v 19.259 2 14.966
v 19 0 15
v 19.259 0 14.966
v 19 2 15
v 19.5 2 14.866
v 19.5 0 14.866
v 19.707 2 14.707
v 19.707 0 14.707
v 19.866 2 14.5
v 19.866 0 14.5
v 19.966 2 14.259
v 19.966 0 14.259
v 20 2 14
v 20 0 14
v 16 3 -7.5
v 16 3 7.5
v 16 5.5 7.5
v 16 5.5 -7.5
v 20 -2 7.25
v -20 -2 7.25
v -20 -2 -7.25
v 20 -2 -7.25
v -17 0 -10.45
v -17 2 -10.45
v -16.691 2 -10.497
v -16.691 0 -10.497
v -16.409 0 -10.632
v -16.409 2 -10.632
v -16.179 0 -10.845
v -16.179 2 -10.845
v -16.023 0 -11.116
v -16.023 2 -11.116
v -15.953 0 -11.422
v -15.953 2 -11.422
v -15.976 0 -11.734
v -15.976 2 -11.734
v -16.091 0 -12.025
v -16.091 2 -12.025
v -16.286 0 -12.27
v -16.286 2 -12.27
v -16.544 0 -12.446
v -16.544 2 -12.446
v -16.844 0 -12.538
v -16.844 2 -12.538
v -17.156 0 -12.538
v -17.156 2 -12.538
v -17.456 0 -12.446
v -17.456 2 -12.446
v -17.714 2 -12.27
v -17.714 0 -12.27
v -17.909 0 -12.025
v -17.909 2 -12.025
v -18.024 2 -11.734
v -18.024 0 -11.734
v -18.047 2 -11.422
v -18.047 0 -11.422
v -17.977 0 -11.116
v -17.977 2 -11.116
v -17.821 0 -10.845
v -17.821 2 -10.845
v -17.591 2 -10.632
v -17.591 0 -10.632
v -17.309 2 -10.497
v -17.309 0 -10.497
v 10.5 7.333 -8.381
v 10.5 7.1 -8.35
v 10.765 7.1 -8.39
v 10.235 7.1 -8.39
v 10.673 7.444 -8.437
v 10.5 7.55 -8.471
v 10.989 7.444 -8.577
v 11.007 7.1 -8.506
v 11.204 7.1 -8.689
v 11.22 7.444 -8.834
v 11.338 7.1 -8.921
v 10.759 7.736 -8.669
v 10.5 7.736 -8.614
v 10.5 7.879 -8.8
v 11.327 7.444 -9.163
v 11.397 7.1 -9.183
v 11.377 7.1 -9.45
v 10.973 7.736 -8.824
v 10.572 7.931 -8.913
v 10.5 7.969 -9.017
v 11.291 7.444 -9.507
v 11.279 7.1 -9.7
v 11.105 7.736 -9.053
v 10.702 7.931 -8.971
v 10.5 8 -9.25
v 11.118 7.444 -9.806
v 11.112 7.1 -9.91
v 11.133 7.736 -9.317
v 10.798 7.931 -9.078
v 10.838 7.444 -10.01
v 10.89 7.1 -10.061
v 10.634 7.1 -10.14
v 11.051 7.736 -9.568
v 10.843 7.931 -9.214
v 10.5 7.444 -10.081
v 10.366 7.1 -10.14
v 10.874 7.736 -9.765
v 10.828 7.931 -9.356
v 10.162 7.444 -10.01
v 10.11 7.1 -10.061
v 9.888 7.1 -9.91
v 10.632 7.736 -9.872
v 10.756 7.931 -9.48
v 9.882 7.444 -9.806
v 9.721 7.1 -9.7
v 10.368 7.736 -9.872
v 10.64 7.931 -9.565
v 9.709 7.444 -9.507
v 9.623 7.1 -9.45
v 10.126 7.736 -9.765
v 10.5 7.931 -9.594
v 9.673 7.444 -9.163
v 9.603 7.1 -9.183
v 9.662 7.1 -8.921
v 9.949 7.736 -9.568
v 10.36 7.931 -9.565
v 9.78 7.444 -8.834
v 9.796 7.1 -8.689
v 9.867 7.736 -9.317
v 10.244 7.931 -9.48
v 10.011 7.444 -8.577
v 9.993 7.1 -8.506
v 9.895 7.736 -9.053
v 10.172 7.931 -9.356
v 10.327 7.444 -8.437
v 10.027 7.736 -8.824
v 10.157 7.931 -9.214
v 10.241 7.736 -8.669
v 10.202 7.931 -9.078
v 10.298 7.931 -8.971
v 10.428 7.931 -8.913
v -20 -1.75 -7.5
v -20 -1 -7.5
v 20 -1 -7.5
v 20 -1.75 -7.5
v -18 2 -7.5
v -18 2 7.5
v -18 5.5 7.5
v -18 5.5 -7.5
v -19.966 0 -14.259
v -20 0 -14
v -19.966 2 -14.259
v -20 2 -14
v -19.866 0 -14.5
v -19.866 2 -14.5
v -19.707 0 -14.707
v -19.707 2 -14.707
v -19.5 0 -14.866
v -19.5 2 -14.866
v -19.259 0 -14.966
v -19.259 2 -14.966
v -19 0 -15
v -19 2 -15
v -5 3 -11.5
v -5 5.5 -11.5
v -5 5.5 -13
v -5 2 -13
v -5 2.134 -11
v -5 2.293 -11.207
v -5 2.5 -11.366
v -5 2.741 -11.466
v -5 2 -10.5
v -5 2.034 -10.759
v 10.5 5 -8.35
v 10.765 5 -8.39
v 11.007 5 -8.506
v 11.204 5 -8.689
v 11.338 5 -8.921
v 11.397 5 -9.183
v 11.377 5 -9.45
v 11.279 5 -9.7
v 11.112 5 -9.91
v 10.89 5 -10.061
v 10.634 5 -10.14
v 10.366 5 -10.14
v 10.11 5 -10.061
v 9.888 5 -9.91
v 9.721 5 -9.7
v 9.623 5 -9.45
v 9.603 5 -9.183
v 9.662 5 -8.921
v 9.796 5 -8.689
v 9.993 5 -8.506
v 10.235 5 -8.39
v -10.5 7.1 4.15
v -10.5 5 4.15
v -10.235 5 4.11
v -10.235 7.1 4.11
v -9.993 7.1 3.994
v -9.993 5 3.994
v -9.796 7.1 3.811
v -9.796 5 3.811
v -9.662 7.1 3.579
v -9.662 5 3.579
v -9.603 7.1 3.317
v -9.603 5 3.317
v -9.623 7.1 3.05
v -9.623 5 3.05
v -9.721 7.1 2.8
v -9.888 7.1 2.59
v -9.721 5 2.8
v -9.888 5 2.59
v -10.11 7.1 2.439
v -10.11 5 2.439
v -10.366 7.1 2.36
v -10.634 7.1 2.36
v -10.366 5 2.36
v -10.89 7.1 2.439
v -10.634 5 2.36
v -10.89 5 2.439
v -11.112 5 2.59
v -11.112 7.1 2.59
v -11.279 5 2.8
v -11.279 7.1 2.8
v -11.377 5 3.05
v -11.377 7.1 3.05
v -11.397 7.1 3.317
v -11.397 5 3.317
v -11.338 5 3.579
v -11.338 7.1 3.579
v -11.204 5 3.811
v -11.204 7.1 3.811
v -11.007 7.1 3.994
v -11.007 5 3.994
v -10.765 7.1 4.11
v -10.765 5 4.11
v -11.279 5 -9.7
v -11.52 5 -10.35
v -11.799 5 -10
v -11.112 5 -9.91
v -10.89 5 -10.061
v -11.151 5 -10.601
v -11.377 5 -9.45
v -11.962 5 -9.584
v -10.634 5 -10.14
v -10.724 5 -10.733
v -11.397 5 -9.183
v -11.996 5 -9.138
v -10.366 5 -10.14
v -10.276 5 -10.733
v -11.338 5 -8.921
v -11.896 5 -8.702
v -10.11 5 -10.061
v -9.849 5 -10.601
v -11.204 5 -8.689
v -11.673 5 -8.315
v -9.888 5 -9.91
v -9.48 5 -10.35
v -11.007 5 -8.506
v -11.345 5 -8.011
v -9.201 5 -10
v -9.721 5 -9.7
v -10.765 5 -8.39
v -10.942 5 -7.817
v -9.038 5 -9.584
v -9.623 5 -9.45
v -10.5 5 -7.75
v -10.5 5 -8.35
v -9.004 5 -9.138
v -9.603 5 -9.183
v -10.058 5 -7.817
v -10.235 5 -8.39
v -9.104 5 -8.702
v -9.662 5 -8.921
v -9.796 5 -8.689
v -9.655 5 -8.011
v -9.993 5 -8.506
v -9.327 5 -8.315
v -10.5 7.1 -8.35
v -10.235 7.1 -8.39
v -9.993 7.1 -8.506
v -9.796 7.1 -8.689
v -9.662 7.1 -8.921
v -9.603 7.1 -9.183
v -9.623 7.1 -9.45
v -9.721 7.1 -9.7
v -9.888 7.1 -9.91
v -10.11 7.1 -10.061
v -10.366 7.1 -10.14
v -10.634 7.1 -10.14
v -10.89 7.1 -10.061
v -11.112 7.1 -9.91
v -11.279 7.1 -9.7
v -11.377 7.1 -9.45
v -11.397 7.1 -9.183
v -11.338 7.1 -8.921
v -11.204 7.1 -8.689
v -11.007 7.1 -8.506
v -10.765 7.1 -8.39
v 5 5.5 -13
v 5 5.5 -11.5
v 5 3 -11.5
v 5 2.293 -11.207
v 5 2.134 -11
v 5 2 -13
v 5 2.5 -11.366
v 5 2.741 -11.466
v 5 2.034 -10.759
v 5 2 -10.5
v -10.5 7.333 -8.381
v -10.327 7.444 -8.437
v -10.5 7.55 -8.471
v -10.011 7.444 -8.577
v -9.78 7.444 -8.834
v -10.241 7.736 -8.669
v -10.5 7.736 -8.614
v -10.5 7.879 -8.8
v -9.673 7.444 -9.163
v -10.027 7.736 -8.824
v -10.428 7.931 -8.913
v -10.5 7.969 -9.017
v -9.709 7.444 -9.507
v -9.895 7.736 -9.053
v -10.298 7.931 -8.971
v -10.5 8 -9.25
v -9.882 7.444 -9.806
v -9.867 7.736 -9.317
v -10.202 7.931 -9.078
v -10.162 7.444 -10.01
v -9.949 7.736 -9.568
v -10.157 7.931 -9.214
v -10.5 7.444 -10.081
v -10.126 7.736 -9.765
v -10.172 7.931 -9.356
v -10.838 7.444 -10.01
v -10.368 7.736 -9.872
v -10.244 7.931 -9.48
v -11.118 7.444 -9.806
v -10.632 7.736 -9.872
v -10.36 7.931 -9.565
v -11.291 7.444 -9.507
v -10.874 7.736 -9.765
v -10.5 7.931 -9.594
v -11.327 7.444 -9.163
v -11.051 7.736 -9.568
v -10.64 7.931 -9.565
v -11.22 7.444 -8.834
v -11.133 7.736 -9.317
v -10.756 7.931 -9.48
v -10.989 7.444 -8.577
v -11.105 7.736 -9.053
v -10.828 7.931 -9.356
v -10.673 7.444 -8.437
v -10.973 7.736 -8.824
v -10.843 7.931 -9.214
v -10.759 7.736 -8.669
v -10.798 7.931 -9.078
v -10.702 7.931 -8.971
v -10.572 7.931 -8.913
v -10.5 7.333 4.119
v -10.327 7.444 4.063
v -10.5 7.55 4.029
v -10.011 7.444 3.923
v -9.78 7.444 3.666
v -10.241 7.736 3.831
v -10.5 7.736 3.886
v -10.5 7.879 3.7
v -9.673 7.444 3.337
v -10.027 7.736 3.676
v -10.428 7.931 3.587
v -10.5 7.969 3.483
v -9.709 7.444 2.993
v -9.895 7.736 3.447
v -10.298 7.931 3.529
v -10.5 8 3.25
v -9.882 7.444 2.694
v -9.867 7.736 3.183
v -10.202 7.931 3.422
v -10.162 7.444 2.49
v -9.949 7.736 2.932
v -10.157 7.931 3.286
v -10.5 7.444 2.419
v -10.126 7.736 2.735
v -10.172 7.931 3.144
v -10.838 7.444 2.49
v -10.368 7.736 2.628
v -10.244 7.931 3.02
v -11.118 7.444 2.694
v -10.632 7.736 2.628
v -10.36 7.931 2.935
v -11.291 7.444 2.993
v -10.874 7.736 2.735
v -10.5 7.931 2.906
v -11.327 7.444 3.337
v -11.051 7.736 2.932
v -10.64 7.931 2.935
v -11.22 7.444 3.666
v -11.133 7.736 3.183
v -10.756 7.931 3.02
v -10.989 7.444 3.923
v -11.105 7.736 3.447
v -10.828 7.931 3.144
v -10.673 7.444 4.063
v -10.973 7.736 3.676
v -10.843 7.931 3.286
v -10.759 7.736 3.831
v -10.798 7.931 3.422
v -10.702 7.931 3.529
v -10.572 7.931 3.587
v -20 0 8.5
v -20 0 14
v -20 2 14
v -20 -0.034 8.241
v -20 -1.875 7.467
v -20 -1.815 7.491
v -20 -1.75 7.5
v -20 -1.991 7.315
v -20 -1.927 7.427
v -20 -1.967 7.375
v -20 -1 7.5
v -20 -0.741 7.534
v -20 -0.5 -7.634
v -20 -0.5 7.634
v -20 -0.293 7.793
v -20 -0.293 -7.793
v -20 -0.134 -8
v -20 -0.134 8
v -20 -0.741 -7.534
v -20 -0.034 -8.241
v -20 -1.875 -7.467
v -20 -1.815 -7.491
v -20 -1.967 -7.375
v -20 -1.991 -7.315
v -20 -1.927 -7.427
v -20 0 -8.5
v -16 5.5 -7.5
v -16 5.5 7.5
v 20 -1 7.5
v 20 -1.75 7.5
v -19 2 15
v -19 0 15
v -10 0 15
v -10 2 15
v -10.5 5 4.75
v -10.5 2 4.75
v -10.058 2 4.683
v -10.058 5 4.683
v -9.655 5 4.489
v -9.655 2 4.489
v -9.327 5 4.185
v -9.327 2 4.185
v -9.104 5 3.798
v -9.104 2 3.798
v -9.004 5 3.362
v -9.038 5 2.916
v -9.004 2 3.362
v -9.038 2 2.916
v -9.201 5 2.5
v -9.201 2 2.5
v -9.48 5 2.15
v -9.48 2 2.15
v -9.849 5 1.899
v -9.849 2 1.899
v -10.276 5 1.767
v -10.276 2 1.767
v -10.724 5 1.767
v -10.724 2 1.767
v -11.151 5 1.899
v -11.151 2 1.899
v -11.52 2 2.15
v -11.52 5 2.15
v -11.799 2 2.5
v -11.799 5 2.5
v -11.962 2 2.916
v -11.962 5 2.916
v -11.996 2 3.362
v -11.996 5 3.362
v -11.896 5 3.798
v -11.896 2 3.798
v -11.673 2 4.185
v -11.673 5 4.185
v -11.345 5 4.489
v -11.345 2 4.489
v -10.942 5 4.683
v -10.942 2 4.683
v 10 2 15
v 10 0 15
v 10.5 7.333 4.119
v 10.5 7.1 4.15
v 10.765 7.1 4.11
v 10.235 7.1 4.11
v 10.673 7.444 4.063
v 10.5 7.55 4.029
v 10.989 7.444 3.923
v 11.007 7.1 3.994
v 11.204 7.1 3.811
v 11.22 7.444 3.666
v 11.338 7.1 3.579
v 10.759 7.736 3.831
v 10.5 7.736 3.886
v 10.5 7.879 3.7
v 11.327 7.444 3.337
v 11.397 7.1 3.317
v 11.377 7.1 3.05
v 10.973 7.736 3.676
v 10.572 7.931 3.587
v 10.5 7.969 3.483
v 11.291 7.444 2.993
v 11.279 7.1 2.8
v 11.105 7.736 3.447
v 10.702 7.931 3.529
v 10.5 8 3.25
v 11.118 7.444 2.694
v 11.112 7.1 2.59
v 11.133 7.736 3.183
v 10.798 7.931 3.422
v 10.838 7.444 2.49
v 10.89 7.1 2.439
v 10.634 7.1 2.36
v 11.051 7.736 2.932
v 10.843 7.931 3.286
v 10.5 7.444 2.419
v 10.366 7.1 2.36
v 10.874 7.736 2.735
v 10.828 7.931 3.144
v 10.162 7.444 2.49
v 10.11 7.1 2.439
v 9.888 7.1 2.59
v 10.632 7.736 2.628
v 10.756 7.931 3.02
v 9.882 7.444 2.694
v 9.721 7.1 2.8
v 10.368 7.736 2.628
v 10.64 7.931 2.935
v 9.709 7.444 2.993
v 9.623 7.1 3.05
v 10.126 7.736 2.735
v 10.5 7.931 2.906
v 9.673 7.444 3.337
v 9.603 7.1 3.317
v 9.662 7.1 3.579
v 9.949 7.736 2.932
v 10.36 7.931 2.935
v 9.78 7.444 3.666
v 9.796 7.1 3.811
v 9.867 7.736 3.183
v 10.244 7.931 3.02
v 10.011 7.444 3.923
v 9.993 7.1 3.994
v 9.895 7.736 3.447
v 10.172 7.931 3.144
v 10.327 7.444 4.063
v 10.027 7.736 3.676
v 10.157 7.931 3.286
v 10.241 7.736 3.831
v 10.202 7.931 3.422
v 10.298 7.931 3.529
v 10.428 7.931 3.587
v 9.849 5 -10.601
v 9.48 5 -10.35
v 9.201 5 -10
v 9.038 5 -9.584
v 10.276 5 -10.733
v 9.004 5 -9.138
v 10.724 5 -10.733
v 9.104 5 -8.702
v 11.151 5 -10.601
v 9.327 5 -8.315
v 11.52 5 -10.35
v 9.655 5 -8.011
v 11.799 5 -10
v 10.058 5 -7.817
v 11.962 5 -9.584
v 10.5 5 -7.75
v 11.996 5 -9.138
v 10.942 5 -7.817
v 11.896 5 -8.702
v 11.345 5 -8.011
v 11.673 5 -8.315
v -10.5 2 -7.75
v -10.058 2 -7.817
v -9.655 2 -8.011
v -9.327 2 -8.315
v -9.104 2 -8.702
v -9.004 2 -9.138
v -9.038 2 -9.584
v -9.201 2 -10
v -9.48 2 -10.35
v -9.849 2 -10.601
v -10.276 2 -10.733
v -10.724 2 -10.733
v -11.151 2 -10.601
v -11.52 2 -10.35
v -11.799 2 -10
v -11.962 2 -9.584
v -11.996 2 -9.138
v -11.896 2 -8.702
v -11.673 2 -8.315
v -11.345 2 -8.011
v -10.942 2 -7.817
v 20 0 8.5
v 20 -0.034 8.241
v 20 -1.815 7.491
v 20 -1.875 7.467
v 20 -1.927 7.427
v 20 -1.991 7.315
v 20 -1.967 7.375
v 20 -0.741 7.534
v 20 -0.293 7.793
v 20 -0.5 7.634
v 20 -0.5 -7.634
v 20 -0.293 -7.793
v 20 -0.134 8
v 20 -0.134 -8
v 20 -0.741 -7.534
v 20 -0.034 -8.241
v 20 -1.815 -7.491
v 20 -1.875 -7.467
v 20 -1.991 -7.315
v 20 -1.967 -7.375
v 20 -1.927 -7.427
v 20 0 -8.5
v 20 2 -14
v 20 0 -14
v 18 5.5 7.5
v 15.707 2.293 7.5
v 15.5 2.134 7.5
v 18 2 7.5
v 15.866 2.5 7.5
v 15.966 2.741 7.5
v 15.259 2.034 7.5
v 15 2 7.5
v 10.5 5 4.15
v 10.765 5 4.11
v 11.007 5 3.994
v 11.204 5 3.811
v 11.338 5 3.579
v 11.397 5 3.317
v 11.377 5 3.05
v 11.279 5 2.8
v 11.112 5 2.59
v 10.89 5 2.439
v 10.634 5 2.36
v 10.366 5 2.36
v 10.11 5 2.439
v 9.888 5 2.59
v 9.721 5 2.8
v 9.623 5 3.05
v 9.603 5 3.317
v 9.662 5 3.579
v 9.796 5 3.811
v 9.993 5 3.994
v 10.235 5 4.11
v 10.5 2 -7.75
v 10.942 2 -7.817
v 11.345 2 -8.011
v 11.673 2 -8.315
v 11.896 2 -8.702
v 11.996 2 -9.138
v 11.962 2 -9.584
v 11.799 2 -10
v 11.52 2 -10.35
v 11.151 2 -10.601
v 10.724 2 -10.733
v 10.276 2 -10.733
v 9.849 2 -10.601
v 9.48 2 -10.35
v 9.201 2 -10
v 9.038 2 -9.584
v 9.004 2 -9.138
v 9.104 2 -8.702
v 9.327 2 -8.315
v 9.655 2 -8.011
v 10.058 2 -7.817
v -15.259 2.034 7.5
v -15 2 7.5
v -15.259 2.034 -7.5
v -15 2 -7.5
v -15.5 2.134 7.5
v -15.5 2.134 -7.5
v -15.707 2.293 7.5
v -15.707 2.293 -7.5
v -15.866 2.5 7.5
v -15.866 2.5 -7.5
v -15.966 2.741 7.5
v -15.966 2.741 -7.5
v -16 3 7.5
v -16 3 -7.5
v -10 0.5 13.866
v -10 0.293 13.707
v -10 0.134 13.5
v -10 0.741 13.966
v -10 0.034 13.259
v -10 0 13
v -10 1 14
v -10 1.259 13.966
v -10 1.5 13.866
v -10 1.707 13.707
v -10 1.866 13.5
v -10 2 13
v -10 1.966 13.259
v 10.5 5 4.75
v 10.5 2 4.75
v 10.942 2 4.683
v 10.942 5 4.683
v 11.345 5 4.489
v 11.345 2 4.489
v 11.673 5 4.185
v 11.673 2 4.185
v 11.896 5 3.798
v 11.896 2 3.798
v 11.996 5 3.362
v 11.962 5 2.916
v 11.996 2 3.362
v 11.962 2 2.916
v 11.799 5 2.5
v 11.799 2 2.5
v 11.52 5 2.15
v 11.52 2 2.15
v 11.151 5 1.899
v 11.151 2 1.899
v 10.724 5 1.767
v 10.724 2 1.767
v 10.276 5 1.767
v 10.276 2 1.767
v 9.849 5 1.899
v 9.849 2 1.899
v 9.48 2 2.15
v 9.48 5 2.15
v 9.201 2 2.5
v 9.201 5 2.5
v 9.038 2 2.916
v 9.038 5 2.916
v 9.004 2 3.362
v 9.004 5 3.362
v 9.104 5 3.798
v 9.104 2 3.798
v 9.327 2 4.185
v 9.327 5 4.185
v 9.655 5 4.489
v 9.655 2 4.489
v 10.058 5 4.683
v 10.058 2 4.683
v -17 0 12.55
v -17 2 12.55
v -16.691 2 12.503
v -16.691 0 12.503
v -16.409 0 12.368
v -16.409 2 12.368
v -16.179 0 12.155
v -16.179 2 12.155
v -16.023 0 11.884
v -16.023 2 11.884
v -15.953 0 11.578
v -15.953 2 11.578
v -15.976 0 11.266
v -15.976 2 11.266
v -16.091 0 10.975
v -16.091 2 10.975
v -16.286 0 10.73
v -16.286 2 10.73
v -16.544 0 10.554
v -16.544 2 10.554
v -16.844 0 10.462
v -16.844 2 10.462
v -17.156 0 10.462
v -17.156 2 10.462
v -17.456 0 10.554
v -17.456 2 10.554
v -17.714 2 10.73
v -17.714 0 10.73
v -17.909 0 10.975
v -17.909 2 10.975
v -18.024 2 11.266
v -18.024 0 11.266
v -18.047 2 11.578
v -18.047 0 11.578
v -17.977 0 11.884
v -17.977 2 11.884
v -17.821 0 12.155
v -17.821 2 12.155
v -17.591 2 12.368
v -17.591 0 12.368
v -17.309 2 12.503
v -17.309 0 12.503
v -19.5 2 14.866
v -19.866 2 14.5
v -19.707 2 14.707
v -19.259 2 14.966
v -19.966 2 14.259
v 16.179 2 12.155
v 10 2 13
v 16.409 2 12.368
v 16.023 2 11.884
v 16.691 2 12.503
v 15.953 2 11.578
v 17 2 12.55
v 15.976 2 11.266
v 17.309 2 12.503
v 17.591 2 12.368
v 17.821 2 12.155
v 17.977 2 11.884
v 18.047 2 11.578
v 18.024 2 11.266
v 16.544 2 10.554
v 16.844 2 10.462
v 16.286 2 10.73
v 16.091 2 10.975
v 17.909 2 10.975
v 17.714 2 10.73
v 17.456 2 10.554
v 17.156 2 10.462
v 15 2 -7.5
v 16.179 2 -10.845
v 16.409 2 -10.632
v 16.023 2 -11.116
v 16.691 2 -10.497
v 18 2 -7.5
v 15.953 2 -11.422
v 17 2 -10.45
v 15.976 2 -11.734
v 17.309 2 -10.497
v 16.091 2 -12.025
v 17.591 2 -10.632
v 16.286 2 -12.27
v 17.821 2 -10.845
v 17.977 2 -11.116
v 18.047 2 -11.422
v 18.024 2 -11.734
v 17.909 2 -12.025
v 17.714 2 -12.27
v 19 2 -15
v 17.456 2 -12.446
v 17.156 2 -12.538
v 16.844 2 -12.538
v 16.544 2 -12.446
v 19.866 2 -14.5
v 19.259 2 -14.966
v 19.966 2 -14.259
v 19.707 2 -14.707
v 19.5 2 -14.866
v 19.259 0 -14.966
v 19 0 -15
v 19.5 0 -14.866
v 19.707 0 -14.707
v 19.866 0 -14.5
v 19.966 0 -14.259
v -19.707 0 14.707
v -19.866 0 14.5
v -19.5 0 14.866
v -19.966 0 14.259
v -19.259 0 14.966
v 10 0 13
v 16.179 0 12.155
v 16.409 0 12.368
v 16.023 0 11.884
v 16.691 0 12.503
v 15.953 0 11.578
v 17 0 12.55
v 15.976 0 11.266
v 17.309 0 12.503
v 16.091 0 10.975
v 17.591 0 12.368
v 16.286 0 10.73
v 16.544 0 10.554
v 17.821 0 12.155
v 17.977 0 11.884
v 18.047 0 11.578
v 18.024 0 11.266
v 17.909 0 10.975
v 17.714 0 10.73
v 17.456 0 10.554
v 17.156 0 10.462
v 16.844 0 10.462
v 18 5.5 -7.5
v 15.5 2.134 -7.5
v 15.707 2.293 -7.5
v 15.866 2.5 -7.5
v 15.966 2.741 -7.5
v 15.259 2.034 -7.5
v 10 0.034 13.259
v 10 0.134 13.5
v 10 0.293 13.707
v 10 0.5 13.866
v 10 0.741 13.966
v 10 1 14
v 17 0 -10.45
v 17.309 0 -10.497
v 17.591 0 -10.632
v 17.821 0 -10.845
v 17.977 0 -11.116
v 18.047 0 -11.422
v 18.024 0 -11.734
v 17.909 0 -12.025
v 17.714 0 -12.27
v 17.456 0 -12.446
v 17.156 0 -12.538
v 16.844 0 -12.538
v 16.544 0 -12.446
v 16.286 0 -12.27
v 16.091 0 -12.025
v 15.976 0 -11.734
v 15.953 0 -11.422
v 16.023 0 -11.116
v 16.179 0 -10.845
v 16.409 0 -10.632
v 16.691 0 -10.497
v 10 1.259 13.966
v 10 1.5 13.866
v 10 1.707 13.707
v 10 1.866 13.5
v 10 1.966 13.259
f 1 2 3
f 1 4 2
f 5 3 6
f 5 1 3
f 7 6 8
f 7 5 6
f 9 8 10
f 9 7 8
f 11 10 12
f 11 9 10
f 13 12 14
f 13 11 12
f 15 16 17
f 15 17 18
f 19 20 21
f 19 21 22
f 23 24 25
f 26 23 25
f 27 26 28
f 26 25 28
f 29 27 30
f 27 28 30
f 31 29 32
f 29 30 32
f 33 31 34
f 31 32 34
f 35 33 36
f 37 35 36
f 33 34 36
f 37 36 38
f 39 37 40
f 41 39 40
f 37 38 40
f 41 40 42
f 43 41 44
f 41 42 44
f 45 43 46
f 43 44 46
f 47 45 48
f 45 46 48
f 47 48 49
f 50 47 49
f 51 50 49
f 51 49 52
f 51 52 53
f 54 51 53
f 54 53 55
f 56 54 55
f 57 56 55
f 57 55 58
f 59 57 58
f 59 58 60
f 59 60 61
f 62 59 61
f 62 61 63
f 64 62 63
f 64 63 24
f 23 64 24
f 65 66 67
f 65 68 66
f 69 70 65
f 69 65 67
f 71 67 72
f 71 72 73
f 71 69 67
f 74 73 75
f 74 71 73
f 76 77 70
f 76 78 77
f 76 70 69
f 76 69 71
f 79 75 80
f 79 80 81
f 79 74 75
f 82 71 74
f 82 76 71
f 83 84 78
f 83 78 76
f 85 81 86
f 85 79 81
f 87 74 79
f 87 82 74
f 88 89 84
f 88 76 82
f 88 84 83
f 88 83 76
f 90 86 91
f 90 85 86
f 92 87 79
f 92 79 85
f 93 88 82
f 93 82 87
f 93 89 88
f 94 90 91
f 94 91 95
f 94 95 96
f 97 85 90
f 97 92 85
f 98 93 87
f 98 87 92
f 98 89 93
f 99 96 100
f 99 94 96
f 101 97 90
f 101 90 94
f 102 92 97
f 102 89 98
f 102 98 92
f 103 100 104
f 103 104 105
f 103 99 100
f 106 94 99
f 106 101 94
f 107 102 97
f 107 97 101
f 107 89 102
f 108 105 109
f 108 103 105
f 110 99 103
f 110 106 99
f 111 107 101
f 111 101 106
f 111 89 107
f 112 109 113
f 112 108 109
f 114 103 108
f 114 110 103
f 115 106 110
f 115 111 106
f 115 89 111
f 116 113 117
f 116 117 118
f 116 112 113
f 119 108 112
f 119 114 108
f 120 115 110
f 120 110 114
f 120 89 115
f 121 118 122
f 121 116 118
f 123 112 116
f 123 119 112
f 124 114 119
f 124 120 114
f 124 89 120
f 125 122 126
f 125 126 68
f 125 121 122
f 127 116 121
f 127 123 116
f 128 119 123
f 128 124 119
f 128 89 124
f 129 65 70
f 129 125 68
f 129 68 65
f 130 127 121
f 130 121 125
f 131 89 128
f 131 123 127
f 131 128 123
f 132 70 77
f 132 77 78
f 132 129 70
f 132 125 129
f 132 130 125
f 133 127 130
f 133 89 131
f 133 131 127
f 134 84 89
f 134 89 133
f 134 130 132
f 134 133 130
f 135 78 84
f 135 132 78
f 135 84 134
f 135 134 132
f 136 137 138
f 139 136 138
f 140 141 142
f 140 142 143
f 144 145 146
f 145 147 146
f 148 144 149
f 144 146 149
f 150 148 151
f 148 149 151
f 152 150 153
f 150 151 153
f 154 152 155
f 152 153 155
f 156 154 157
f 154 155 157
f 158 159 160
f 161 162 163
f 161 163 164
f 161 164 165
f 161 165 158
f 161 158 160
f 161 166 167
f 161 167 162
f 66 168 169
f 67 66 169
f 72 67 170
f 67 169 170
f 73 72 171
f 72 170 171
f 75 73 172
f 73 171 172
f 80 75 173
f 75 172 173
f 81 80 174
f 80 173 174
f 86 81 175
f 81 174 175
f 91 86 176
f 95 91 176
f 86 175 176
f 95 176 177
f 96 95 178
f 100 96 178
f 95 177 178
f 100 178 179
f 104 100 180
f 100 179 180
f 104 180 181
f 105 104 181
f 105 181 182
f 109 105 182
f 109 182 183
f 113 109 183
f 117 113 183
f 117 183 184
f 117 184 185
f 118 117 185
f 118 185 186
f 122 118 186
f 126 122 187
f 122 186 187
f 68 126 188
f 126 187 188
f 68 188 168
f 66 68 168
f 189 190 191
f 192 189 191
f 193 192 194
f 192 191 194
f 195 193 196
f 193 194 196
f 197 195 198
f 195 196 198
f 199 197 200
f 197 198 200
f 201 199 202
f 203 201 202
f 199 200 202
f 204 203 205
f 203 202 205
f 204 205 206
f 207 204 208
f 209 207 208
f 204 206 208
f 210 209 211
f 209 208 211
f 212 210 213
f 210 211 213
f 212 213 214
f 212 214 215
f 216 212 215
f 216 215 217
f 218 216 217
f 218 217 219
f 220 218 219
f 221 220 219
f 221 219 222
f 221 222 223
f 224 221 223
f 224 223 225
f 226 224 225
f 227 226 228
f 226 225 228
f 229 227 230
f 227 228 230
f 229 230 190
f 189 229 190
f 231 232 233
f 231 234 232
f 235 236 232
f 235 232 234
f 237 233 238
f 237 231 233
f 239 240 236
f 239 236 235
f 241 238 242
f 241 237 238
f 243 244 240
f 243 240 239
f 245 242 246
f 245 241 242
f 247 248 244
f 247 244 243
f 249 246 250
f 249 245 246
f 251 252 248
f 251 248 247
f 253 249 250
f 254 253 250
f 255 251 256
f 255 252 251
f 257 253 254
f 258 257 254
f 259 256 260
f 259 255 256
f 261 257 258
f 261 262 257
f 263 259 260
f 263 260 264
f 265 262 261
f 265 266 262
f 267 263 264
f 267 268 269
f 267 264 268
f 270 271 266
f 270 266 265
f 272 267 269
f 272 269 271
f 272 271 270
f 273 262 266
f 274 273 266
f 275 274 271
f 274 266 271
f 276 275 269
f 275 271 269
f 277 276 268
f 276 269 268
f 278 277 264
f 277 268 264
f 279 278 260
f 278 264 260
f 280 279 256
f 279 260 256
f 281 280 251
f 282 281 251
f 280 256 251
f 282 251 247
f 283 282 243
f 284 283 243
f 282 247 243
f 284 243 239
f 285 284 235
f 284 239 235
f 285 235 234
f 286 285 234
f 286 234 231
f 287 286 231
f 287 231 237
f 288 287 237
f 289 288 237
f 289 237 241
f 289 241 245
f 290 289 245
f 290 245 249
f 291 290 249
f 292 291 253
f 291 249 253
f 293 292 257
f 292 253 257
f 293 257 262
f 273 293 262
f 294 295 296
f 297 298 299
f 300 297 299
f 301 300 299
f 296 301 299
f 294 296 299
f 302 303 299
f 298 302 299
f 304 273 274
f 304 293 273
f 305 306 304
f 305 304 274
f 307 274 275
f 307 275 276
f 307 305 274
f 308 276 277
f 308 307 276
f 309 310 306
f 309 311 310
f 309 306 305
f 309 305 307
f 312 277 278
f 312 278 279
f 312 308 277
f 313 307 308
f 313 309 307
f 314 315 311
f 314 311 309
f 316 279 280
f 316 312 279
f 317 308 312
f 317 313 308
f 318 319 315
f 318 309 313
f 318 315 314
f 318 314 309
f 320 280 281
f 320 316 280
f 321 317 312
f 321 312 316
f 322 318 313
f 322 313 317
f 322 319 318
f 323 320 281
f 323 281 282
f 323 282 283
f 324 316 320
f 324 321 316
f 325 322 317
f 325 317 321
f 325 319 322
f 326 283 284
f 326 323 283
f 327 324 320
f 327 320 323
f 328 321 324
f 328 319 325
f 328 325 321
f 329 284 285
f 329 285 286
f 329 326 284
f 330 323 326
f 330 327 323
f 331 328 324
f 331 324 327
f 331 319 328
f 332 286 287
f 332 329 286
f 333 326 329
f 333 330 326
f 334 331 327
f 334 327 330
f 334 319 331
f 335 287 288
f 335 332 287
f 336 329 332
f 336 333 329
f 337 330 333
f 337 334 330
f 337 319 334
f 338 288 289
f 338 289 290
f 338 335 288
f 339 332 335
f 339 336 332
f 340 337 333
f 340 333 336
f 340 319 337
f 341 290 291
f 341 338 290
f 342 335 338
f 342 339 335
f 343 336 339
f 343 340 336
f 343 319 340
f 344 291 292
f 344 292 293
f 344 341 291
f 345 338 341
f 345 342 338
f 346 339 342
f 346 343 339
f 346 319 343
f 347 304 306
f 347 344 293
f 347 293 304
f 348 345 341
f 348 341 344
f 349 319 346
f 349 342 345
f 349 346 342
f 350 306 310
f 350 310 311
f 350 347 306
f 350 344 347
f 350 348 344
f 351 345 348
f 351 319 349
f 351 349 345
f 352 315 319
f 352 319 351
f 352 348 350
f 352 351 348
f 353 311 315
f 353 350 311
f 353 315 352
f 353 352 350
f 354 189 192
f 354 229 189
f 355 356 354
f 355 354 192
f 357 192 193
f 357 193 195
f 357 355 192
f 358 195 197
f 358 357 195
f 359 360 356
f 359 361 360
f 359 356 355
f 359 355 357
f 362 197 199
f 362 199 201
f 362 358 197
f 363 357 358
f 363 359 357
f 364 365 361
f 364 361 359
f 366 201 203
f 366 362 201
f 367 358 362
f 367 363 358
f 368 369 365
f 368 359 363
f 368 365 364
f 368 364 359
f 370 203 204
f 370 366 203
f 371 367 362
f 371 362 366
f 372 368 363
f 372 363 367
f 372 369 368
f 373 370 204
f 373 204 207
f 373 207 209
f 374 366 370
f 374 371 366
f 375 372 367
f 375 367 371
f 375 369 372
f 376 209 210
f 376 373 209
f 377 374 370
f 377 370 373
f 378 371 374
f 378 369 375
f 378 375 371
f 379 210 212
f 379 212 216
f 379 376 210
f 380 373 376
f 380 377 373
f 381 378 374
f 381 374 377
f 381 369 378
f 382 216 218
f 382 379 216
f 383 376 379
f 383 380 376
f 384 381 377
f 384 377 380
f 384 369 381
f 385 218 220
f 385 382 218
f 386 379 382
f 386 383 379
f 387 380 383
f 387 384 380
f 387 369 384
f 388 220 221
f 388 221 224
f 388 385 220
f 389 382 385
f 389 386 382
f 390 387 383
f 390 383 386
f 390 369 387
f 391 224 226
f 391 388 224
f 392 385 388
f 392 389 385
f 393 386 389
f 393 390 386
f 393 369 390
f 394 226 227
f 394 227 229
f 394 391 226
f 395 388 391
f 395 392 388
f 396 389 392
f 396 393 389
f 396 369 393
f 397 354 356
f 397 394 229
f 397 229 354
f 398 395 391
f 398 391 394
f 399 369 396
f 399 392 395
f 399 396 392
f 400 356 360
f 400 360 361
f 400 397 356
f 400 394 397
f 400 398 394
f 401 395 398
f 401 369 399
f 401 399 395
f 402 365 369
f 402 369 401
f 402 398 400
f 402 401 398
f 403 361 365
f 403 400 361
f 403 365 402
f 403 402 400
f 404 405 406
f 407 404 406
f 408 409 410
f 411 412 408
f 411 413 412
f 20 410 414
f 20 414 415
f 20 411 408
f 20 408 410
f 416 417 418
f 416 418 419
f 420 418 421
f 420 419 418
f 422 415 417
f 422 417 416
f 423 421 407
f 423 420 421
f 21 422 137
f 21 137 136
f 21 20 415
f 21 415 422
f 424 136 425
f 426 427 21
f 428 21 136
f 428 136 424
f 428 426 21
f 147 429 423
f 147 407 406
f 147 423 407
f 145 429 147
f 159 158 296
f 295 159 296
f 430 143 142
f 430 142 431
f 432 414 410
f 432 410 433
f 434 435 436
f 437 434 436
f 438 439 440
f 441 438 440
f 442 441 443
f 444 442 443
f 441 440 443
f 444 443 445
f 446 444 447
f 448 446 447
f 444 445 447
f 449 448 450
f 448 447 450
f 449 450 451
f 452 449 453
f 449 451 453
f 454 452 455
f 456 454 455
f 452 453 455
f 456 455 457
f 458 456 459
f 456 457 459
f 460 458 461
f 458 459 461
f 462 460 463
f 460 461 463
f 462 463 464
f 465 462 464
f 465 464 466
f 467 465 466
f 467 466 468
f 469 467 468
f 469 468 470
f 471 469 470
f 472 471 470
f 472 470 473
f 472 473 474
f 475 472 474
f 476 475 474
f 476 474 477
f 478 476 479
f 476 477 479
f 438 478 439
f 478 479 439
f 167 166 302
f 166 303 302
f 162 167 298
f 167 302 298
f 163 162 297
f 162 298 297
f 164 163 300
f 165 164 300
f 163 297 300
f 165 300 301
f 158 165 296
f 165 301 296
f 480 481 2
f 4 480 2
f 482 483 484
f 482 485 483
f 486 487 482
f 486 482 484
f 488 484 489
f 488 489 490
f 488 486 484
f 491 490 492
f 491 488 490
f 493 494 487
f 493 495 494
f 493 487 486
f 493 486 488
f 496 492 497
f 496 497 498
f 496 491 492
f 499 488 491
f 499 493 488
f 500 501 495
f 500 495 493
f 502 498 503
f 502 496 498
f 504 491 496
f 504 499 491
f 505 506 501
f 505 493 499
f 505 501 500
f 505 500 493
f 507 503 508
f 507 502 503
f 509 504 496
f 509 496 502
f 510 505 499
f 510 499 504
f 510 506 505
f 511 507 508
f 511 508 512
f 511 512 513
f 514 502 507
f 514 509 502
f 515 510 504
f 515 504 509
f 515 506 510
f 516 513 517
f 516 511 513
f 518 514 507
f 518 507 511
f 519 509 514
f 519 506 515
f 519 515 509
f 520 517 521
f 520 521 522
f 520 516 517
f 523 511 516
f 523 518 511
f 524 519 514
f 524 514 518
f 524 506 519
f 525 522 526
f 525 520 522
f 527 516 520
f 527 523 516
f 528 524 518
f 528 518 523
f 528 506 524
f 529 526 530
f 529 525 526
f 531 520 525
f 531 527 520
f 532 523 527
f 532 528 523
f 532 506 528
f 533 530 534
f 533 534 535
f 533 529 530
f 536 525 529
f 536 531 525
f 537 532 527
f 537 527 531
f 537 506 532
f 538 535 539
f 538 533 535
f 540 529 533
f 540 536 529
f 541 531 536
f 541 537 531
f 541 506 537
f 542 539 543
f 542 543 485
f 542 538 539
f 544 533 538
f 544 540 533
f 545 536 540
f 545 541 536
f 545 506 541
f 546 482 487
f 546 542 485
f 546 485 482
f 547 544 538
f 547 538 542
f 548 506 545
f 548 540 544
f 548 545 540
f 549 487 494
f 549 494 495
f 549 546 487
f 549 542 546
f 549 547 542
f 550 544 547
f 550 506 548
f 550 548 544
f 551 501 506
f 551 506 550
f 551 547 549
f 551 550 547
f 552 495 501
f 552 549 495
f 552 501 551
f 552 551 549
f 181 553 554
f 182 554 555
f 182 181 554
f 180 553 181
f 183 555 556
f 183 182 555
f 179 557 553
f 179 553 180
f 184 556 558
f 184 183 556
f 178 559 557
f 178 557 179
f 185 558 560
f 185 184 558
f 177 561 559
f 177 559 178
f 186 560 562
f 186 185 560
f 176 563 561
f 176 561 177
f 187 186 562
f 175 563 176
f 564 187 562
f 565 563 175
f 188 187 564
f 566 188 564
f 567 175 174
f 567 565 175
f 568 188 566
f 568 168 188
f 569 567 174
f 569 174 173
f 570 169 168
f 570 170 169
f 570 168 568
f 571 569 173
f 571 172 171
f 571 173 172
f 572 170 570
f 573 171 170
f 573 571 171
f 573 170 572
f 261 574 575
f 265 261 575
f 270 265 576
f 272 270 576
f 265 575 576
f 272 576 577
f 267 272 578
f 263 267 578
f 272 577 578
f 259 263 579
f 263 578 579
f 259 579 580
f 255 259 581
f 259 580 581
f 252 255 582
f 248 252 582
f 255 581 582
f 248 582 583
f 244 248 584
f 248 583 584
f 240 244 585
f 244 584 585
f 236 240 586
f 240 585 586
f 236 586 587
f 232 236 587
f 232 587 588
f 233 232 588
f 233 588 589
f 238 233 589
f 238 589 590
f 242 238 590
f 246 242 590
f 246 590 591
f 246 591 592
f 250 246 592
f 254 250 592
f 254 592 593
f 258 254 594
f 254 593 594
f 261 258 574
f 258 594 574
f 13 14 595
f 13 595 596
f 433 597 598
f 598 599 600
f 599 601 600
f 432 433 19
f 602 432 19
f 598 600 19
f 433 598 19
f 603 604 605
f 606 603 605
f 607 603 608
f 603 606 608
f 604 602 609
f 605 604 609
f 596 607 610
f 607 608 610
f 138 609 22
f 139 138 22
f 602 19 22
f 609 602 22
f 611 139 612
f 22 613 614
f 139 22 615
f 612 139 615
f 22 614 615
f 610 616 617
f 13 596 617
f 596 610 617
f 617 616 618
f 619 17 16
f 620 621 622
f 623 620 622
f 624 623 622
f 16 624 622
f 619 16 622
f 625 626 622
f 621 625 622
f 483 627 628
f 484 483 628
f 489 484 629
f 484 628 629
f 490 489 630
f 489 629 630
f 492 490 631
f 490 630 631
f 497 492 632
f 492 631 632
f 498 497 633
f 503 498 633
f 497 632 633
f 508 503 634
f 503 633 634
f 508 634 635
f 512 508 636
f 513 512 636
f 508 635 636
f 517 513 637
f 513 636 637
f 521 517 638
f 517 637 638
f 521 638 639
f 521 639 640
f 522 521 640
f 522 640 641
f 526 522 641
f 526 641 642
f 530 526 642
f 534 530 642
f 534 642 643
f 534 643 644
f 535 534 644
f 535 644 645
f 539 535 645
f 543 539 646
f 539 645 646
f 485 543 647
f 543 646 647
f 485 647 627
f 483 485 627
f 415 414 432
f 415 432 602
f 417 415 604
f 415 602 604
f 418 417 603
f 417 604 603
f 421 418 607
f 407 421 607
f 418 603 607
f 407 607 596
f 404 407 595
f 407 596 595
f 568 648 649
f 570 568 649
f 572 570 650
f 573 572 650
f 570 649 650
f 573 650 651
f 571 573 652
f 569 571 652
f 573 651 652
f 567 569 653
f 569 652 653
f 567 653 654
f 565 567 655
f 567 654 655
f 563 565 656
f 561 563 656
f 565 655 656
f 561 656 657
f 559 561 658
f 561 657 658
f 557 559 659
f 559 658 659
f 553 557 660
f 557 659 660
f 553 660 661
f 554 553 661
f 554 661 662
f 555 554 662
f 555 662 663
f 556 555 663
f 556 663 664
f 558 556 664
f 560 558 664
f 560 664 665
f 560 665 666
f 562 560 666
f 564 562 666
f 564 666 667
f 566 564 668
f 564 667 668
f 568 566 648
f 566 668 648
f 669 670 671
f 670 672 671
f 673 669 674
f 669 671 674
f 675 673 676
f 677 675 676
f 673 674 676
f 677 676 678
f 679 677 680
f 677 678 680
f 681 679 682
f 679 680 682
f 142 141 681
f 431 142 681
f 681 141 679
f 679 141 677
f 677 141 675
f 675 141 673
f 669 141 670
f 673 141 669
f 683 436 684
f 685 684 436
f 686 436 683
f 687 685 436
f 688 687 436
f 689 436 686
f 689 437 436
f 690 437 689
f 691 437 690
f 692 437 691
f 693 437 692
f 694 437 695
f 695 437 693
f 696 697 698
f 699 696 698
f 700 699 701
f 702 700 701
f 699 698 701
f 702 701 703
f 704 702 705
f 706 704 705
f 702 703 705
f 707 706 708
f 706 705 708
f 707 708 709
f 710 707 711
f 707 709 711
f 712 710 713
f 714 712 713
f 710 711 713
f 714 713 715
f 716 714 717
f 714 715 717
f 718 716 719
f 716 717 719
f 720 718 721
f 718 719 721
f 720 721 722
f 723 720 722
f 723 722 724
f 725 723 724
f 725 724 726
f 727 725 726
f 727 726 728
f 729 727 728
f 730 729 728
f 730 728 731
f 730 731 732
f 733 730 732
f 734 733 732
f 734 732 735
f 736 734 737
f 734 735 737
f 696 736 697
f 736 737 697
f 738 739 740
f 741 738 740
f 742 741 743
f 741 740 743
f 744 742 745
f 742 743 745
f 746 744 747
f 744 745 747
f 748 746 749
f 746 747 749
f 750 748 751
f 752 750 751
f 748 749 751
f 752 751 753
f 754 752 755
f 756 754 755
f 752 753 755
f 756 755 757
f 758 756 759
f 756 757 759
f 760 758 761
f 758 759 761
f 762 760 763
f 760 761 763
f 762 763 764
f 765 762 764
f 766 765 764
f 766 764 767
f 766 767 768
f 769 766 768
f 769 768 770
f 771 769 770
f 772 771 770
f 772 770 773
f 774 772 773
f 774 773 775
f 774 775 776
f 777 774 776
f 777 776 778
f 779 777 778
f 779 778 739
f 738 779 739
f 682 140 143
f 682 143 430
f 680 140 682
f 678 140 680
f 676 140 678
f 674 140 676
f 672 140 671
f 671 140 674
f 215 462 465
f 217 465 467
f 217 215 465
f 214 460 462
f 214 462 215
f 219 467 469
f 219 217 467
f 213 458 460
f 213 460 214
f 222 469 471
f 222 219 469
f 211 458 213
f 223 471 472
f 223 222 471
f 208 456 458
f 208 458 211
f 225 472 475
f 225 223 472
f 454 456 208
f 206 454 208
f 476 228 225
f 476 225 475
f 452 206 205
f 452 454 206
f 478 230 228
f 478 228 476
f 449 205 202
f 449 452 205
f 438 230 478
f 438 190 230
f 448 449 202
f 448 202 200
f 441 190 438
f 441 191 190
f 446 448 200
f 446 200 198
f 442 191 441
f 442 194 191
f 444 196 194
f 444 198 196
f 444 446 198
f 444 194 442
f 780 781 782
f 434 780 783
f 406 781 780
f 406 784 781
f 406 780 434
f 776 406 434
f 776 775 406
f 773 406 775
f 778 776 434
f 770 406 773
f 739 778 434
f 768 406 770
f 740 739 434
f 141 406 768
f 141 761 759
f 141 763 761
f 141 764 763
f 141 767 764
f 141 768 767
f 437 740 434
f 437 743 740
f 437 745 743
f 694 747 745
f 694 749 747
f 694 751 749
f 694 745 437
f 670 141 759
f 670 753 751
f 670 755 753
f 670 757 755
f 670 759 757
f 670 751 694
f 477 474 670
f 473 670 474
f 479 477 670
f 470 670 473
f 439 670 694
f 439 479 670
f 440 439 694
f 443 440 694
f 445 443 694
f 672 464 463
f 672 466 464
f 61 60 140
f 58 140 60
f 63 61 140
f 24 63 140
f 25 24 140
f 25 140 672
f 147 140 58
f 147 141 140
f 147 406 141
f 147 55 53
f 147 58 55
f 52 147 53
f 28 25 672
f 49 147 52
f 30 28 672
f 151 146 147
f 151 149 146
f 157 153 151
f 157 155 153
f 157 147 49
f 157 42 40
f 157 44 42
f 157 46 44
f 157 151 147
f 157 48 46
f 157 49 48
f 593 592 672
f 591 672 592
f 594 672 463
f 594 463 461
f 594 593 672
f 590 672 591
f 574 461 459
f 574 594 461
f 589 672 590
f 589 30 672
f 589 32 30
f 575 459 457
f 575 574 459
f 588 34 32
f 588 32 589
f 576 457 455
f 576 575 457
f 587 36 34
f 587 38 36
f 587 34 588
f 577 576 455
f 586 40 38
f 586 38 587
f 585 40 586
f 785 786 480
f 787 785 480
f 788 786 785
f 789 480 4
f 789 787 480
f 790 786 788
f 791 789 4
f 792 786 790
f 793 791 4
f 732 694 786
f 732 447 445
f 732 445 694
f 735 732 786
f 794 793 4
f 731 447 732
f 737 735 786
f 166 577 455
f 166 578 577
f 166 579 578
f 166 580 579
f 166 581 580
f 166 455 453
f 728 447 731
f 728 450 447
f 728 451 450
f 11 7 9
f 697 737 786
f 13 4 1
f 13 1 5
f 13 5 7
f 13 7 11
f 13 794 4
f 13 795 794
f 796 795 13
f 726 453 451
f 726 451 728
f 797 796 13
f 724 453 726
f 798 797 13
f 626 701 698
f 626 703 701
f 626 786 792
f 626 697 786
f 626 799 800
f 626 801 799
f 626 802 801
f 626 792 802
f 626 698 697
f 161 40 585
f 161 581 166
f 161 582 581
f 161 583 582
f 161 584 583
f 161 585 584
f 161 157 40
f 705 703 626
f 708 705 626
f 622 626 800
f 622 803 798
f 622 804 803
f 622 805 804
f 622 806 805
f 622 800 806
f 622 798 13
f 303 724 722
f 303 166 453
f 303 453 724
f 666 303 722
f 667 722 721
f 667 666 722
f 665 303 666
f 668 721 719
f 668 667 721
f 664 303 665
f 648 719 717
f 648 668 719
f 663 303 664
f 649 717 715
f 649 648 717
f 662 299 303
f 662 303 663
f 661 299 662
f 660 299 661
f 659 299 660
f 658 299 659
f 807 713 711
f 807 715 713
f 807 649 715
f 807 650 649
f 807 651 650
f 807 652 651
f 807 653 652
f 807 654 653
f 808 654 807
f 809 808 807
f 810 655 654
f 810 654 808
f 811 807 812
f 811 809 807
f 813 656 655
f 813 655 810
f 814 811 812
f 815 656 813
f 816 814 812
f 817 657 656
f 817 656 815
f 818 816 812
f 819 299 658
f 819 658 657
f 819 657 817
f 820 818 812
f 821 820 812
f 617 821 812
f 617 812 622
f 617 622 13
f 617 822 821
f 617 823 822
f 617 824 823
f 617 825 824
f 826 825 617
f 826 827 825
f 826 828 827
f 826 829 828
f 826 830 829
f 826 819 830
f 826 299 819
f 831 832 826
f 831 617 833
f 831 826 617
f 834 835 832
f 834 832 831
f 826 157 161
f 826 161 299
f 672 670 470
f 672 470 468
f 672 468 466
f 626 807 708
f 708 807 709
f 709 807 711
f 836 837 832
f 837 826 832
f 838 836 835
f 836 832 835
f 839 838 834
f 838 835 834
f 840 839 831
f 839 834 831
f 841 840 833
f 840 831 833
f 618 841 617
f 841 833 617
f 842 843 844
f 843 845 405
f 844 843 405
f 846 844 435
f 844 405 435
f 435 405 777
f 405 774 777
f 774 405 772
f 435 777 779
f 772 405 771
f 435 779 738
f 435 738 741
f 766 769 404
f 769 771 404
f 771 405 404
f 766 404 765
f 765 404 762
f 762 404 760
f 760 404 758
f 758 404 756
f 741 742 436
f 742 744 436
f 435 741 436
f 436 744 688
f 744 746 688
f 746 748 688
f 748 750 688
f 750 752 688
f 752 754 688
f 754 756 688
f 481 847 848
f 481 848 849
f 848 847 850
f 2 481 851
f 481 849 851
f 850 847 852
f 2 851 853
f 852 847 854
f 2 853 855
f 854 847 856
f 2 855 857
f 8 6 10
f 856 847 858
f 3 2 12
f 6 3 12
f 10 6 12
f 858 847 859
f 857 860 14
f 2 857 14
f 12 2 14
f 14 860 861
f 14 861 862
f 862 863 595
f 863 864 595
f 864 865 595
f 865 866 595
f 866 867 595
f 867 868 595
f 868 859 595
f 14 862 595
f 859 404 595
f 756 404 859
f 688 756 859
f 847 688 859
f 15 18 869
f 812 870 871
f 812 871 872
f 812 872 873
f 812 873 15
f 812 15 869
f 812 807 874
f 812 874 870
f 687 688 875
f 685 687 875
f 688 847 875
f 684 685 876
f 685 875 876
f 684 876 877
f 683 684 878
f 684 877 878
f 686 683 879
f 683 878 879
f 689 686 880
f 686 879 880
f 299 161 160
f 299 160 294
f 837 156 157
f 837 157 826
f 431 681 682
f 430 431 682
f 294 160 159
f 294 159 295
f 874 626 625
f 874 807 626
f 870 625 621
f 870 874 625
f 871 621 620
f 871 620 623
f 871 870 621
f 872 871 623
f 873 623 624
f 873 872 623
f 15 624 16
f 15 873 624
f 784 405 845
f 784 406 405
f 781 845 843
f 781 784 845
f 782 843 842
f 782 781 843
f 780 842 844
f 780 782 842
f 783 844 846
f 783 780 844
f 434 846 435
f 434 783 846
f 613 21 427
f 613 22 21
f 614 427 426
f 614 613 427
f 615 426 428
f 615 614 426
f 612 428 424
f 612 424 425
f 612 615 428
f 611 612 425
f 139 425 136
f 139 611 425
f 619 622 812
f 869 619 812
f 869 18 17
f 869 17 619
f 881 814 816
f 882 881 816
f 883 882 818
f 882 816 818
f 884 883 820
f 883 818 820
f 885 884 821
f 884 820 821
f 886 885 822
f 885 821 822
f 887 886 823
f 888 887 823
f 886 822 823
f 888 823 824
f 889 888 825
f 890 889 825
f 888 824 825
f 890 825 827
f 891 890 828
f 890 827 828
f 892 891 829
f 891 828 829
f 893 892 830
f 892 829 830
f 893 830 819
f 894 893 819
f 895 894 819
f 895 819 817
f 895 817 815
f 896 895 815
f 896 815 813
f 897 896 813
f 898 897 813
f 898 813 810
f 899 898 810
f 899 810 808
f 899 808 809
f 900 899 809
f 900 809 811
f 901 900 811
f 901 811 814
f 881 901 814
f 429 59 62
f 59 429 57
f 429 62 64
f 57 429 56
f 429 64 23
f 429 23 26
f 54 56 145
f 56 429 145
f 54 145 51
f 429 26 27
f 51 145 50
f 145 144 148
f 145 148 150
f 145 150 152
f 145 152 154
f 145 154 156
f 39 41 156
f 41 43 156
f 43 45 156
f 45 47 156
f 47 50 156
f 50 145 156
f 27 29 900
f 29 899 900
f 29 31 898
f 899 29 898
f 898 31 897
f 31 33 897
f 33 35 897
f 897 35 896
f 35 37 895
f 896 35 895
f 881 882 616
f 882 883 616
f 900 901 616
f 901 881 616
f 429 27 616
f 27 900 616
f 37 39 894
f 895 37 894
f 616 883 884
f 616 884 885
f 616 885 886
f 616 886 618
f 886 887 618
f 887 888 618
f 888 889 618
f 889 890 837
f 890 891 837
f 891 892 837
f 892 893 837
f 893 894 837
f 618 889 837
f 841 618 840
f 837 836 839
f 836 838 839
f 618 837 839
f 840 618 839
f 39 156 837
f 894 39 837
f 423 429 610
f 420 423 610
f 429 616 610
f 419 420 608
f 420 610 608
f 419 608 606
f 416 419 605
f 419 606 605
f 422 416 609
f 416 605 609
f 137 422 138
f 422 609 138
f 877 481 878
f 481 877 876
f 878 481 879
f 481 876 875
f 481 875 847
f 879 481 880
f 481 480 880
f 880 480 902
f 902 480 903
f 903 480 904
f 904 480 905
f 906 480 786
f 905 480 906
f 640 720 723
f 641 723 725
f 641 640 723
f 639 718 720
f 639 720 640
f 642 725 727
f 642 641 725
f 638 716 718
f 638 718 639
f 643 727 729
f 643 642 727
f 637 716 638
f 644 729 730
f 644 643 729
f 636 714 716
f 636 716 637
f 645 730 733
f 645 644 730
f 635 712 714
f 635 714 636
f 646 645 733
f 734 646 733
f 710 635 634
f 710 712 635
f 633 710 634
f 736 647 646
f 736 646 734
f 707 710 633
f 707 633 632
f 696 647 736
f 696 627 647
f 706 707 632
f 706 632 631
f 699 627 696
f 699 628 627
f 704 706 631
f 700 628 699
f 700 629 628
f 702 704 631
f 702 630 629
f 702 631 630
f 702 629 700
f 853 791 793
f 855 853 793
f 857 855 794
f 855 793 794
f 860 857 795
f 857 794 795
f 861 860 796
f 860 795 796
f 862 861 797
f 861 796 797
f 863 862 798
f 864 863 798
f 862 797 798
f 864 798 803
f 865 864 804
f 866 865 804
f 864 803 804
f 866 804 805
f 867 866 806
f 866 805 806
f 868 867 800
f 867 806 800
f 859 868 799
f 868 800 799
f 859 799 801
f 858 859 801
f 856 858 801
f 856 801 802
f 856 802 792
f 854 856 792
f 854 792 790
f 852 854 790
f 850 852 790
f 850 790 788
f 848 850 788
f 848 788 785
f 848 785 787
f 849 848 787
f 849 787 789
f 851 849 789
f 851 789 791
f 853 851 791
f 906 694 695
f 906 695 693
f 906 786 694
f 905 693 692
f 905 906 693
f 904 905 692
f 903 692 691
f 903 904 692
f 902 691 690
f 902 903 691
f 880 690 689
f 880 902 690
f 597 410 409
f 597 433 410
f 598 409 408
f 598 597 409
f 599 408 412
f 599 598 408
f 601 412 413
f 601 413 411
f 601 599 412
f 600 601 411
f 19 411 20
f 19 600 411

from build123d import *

# Parameters (mm, degrees)
SKETCH3_W               = 40
SKETCH3_H               = 30
BOSS_EXTRUDE1_DEPTH     = 2
SKETCH4_R               = 1.5
BOSS_EXTRUDE2_DEPTH     = 3
FILLET1_R               = 1
SKETCH8_W               = 20
SKETCH8_H               = 1
CUT_EXTRUDE2_DEPTH      = 2
FILLET3_R               = 1
SKETCH9_R               = 0.9
BOSS_EXTRUDE5_DEPTH     = 3
LPATTERN3_COUNT         = 2
LPATTERN3_PITCH         = 21
LPATTERN3_COUNT_DIR2    = 2
LPATTERN3_PITCH_DIR2    = 12.5
FILLET4_R               = 0.9
FILLET5_R               = 1
SKETCH11_R              = 1.05
CUT_EXTRUDE3_DEPTH      = 26.709920264
LPATTERN4_COUNT         = 2
LPATTERN4_PITCH         = 23
LPATTERN4_COUNT_DIR2    = 2
LPATTERN4_PITCH_DIR2    = 34
SKETCH12_W              = 40
SKETCH12_H              = 2.5
BOSS_EXTRUDE7_DEPTH     = 10
SKETCH13_R              = 2
CUT_EXTRUDE4_DEPTH      = 10
SKETCH14_W              = 2
SKETCH14_H              = 15
SKETCH14_W_2            = 10
SKETCH14_H_2            = 1.5
BOSS_EXTRUDE8_DEPTH     = 3.5
FILLET6_R               = 1
CUT_EXTRUDE5_DEPTH      = 44.874821937
CUT_EXTRUDE5_DEPTH_BACK = 44.874821937
SKETCH15_W              = 33.433671885
SKETCH15_H              = 17.879130682
SKETCH16_W              = 40
SKETCH16_H              = 15
BOSS_EXTRUDE9_DEPTH     = 2
FILLET8_R               = 1
FILLET9_R               = 1
FILLET10_R              = 0.25


with BuildPart() as part:
    # Sketch3 → Boss-Extrude1 (new body)
    with BuildSketch(Plane(origin=(0, 0, 0), x_dir=(1, 0, 0), z_dir=(0, 1, 0))):
        Rectangle(SKETCH3_W, SKETCH3_H)
    extrude(amount=BOSS_EXTRUDE1_DEPTH)

    # Sketch4 → Boss-Extrude2 (add)
    with BuildSketch(Plane(origin=(0, 2, 0), x_dir=(1, 0, 0), z_dir=(0, 1, 0))):
        with Locations(Location((-10.5, 9.25, 0), (0, 0, 270))):
            Circle(SKETCH4_R)
        with Locations(Location((10.5, 9.25, 0), (0, 0, 270))):
            Circle(SKETCH4_R)
        with Locations(Location((10.5, -3.25, 0), (0, 0, 270))):
            Circle(SKETCH4_R)
        with Locations(Location((-10.5, -3.25, 0), (0, 0, 270))):
            Circle(SKETCH4_R)
    extrude(amount=BOSS_EXTRUDE2_DEPTH)

    # Fillet1
    fillet1_edges = [part.edges().sort_by_distance(p)[0] for p in [
        (-20, 1, -15),
        (20, 1, -15),
    ]]
    fillet(fillet1_edges, radius=FILLET1_R)

    # Sketch8 → Cut-Extrude2 (cut)
    with BuildSketch(Plane(origin=(0, 2, 0), x_dir=(1, 0, 0), z_dir=(0, 1, 0))):
        with Locations((0, -14.5)):
            Rectangle(SKETCH8_W, SKETCH8_H)
    extrude(amount=-CUT_EXTRUDE2_DEPTH, mode=Mode.SUBTRACT)

    # Fillet3
    fillet3_edges = [part.edges().sort_by_distance(p)[0] for p in [
        (0, 0, 14),
        (0, 2, 14),
    ]]
    fillet(fillet3_edges, radius=FILLET3_R - 0.0001)  # a hair under: the kernel refuses the full size

    # Sketch9 → Boss-Extrude5 (add)
    with BuildSketch(Plane(origin=(0, 5, 0), x_dir=(1, 0, 0), z_dir=(0, 1, 0))):
        with Locations(Location((-10.5, 9.25, 0), (0, 0, 270))):
            Circle(SKETCH9_R)
    boss_extrude5 = extrude(amount=BOSS_EXTRUDE5_DEPTH)

    # LPattern3: Boss-Extrude5 2 × 2
    with Locations(*[(i * LPATTERN3_PITCH, 0, j * LPATTERN3_PITCH_DIR2) for i in range(LPATTERN3_COUNT) for j in range(LPATTERN3_COUNT_DIR2) if (i, j) != (0, 0)]):
        add(boss_extrude5)

    # Fillet4
    fillet4_edges = [part.edges().sort_by_distance(p)[0] for p in [
        (-10.5, 8, -10.15),
        (-10.5, 8, 2.35),
        (10.5, 8, -10.15),
        (10.5, 8, 2.35),
    ]]
    fillet(fillet4_edges, radius=FILLET4_R)

    # Fillet5
    fillet5_edges = [part.edges().sort_by_distance(p)[0] for p in [
        (20, 1, 15),
        (-20, 1, 15),
    ]]
    fillet(fillet5_edges, radius=FILLET5_R)

    # Sketch11 → Cut-Extrude3 (cut, through all)
    with BuildSketch(Plane(origin=(0, 2, 0), x_dir=(1, 0, 0), z_dir=(0, 1, 0))):
        with Locations(Location((-17, -11.5, 0), (0, 0, 270))):
            Circle(SKETCH11_R)
    cut_extrude3 = extrude(amount=-CUT_EXTRUDE3_DEPTH, mode=Mode.SUBTRACT)

    # LPattern4: Cut-Extrude3 2 × 2
    with Locations(*[(j * LPATTERN4_PITCH_DIR2, 0, -i * LPATTERN4_PITCH) for i in range(LPATTERN4_COUNT) for j in range(LPATTERN4_COUNT_DIR2) if (i, j) != (0, 0)]):
        add(cut_extrude3, mode=Mode.SUBTRACT)

    # Sketch12 → Boss-Extrude7 (add)
    with BuildSketch(Plane(origin=(0, 0, 0), x_dir=(-1, 0, 0), z_dir=(0, -1, 0))):
        with Locations((0, 2.25)):
            Rectangle(SKETCH12_W, SKETCH12_H)
    extrude(amount=BOSS_EXTRUDE7_DEPTH)

    # Sketch13 → Cut-Extrude4 (cut)
    with BuildSketch(Plane(origin=(0, 0, -3.5), x_dir=(-1, 0, 0), z_dir=(0, 0, -1))):
        with Locations((12, -5)):
            Circle(SKETCH13_R)
        with Locations((0, -5)):
            Circle(SKETCH13_R)
    extrude(amount=-CUT_EXTRUDE4_DEPTH, mode=Mode.SUBTRACT)

    # Sketch14 → Boss-Extrude8 (add)
    with BuildSketch(Plane(origin=(0, 2, 0), x_dir=(1, 0, 0), z_dir=(0, 1, 0))):
        with Locations((-17, 0)):
            Rectangle(SKETCH14_W, SKETCH14_H)
        with Locations((17, 0)):
            Rectangle(SKETCH14_W, SKETCH14_H)
        with Locations((0, 12.25)):
            Rectangle(SKETCH14_W_2, SKETCH14_H_2)
    extrude(amount=BOSS_EXTRUDE8_DEPTH)

    # Fillet6
    fillet6_edges = [part.edges().sort_by_distance(p)[0] for p in [
        (-16, 2, 0),
        (16, 2, 0),
        (0, 2, -11.5),
    ]]
    fillet(fillet6_edges, radius=FILLET6_R)

    # Sketch15 → Cut-Extrude5 (cut, two sides: drawn at the far end of the back side and taken through both)
    with BuildSketch(Plane.ZY.offset(20).offset(-CUT_EXTRUDE5_DEPTH_BACK)):
        with Locations((1.181680204, -8.939565341)):
            Rectangle(SKETCH15_W, SKETCH15_H)
    extrude(amount=CUT_EXTRUDE5_DEPTH + CUT_EXTRUDE5_DEPTH_BACK, mode=Mode.SUBTRACT)

    # Sketch16 → Boss-Extrude9 (add)
    with BuildSketch(Plane.XZ):
        Rectangle(SKETCH16_W, SKETCH16_H)
    extrude(amount=BOSS_EXTRUDE9_DEPTH)

    # Fillet8
    fillet8_edges = [part.edges().sort_by_distance(p)[0] for p in [
        (0, 0, -7.5),
    ]]
    fillet(fillet8_edges, radius=FILLET8_R)

    # Fillet9
    fillet9_edges = [part.edges().sort_by_distance(p)[0] for p in [
        (0, 0, 7.5),
    ]]
    fillet(fillet9_edges, radius=FILLET9_R)

    # Fillet10
    fillet10_edges = [part.edges().sort_by_distance(p)[0] for p in [
        (0, -2, 7.5),
        (0, -2, -7.5),
    ]]
    fillet(fillet10_edges, radius=FILLET10_R)


solid = part.part
